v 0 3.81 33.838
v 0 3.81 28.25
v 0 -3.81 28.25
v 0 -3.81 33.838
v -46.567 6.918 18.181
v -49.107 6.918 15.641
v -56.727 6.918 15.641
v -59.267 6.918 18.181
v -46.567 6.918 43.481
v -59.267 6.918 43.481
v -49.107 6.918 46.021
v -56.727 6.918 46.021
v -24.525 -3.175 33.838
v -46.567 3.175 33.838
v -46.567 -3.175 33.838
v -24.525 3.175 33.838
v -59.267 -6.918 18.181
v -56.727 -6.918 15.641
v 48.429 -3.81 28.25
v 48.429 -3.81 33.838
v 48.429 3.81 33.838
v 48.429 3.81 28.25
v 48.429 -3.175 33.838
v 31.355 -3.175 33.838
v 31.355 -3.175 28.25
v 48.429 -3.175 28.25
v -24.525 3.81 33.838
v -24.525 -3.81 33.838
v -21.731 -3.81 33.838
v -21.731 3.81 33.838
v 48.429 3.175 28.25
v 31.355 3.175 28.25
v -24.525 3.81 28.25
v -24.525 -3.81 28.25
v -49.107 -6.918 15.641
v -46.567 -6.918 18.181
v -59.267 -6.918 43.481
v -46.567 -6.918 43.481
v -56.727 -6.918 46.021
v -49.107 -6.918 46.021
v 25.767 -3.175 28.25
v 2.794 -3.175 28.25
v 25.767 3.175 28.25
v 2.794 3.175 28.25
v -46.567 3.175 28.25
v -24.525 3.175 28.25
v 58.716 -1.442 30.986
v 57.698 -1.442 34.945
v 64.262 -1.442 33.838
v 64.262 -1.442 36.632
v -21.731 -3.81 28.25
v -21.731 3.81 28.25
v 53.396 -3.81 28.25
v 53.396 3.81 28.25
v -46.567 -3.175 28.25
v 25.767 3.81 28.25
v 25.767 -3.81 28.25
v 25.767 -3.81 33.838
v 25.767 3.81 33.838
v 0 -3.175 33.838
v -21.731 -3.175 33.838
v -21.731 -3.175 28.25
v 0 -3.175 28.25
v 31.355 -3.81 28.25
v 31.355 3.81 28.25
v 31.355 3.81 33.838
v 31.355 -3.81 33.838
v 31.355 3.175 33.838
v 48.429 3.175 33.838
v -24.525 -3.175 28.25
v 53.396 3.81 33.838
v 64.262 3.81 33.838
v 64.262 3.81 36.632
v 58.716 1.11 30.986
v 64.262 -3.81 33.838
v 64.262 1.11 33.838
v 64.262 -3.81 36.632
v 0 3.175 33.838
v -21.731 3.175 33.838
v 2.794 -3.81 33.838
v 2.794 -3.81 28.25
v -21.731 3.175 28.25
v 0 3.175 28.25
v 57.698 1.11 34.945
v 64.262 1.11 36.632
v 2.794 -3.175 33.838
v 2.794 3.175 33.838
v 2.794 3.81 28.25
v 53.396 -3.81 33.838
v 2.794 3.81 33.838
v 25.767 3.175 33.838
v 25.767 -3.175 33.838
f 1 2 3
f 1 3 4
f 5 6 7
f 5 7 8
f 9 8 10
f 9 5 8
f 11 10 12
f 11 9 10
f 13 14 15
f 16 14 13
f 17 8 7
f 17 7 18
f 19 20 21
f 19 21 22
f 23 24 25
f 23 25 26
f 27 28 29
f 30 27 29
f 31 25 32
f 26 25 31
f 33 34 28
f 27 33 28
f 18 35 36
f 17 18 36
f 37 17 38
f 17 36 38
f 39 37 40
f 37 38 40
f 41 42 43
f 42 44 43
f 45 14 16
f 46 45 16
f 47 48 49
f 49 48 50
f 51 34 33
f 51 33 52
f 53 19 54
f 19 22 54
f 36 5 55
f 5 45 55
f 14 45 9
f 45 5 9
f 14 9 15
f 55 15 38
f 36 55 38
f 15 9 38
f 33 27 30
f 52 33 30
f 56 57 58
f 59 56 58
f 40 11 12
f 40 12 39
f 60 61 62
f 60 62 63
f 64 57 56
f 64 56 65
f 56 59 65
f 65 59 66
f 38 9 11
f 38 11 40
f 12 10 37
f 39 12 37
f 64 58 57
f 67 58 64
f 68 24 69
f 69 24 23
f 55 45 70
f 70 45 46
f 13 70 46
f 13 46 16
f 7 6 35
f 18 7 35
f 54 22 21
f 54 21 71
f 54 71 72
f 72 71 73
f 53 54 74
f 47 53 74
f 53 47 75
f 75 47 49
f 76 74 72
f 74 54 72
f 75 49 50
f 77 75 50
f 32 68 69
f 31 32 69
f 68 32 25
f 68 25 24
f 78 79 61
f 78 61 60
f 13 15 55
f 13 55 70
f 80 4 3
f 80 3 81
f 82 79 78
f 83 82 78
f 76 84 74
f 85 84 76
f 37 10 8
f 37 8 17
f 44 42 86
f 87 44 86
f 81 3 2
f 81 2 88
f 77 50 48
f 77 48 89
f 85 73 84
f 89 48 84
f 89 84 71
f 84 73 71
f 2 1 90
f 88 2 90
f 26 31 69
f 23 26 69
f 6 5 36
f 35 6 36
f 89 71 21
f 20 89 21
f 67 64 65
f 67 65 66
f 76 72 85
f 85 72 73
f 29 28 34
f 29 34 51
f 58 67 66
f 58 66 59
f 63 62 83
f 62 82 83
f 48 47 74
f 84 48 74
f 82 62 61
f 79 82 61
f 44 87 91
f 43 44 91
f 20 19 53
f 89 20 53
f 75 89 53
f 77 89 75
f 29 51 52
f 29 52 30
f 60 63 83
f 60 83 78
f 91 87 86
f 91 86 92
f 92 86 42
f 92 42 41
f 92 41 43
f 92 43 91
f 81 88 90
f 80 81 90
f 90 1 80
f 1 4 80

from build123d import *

# Parameters (mm, degrees)
F0_W     = 22.041556
F0_H     = 5.588
F0_W_2   = 21.731113
F0_W_3   = 22.972888
F0_W_4   = 17.074447
F1_DEPTH = 3.175
F2_W     = 13.836319
F2_H     = 30.379739
F3_DEPTH = 12.7
F0_W_5   = 2.794
F4_DEPTH = 3.81
F5_W     = 6.777749
F5_H     = 2.552284
F6_DEPTH = 12.7
F7_SIZE  = 2.54


with BuildPart() as f1:
    # F0 (on Front) → F1 (new body, symmetric)
    with BuildSketch(Plane.XZ):
        with Locations((-35.545891, 31.044446)):
            Rectangle(F0_W, F0_H)
        with Locations((-10.865557, 31.044446)):
            Rectangle(F0_W_2, F0_H)
        with Locations((14.280444, 31.044446)):
            Rectangle(F0_W_3, F0_H)
        with Locations((39.892111, 31.044446)):
            Rectangle(F0_W_4, F0_H)
    extrude(amount=F1_DEPTH, both=True)

    # F2 (on face) → F3 (join)
    with BuildSketch(Plane(origin=(-46.566669, 0, 0), x_dir=(0, -1, 0), z_dir=(-1, 0, 0))):
        with Locations((1e-06, 30.830921)):
            Rectangle(F2_W, F2_H)
    extrude(amount=F3_DEPTH)

    # F7
    f7_edges = [f1.edges().sort_by_distance(p)[0] for p in [
        (-59.266669, 0, 46.020791),
        (-59.266669, 0, 15.641052),
        (-46.566669, 0, 15.641052),
        (-46.566669, 0, 46.020791),
    ]]
    chamfer(f7_edges, length=F7_SIZE)


with BuildPart() as f4:
    # F0 (on Front) → F4 (new body, symmetric)
    with BuildSketch(Plane.XZ):
        with Locations((27.163888, 31.044446)):
            Rectangle(F0_W_5, F0_H)
        with Locations((29.957888, 31.044446)):
            Rectangle(F0_W_5, F0_H)
        Polygon((53.396446, 33.838446), (48.429335, 33.838446), (48.429335, 28.250446), (53.396446, 28.250446), (64.262, 33.838446), (64.262, 36.632446), align=None)
        with Locations((-23.128113, 31.044446)):
            Rectangle(F0_W_5, F0_H)
        with Locations((1.397, 31.044446)):
            Rectangle(F0_W_5, F0_H)
    extrude(amount=F4_DEPTH, both=True)

    # F5 (on face) → F6 (cut, symmetric)
    with BuildSketch(Plane(origin=(-4.849922, 0, 18.860806), x_dir=(0.968493, 0, 0.249041), z_dir=(-0.249041, 0, 0.968493))):
        with Locations((67.971401, -0.166117)):
            Rectangle(F5_W, F5_H)
    extrude(amount=F6_DEPTH, both=True, mode=Mode.SUBTRACT)


solid = Compound([f1.part, f4.part])
